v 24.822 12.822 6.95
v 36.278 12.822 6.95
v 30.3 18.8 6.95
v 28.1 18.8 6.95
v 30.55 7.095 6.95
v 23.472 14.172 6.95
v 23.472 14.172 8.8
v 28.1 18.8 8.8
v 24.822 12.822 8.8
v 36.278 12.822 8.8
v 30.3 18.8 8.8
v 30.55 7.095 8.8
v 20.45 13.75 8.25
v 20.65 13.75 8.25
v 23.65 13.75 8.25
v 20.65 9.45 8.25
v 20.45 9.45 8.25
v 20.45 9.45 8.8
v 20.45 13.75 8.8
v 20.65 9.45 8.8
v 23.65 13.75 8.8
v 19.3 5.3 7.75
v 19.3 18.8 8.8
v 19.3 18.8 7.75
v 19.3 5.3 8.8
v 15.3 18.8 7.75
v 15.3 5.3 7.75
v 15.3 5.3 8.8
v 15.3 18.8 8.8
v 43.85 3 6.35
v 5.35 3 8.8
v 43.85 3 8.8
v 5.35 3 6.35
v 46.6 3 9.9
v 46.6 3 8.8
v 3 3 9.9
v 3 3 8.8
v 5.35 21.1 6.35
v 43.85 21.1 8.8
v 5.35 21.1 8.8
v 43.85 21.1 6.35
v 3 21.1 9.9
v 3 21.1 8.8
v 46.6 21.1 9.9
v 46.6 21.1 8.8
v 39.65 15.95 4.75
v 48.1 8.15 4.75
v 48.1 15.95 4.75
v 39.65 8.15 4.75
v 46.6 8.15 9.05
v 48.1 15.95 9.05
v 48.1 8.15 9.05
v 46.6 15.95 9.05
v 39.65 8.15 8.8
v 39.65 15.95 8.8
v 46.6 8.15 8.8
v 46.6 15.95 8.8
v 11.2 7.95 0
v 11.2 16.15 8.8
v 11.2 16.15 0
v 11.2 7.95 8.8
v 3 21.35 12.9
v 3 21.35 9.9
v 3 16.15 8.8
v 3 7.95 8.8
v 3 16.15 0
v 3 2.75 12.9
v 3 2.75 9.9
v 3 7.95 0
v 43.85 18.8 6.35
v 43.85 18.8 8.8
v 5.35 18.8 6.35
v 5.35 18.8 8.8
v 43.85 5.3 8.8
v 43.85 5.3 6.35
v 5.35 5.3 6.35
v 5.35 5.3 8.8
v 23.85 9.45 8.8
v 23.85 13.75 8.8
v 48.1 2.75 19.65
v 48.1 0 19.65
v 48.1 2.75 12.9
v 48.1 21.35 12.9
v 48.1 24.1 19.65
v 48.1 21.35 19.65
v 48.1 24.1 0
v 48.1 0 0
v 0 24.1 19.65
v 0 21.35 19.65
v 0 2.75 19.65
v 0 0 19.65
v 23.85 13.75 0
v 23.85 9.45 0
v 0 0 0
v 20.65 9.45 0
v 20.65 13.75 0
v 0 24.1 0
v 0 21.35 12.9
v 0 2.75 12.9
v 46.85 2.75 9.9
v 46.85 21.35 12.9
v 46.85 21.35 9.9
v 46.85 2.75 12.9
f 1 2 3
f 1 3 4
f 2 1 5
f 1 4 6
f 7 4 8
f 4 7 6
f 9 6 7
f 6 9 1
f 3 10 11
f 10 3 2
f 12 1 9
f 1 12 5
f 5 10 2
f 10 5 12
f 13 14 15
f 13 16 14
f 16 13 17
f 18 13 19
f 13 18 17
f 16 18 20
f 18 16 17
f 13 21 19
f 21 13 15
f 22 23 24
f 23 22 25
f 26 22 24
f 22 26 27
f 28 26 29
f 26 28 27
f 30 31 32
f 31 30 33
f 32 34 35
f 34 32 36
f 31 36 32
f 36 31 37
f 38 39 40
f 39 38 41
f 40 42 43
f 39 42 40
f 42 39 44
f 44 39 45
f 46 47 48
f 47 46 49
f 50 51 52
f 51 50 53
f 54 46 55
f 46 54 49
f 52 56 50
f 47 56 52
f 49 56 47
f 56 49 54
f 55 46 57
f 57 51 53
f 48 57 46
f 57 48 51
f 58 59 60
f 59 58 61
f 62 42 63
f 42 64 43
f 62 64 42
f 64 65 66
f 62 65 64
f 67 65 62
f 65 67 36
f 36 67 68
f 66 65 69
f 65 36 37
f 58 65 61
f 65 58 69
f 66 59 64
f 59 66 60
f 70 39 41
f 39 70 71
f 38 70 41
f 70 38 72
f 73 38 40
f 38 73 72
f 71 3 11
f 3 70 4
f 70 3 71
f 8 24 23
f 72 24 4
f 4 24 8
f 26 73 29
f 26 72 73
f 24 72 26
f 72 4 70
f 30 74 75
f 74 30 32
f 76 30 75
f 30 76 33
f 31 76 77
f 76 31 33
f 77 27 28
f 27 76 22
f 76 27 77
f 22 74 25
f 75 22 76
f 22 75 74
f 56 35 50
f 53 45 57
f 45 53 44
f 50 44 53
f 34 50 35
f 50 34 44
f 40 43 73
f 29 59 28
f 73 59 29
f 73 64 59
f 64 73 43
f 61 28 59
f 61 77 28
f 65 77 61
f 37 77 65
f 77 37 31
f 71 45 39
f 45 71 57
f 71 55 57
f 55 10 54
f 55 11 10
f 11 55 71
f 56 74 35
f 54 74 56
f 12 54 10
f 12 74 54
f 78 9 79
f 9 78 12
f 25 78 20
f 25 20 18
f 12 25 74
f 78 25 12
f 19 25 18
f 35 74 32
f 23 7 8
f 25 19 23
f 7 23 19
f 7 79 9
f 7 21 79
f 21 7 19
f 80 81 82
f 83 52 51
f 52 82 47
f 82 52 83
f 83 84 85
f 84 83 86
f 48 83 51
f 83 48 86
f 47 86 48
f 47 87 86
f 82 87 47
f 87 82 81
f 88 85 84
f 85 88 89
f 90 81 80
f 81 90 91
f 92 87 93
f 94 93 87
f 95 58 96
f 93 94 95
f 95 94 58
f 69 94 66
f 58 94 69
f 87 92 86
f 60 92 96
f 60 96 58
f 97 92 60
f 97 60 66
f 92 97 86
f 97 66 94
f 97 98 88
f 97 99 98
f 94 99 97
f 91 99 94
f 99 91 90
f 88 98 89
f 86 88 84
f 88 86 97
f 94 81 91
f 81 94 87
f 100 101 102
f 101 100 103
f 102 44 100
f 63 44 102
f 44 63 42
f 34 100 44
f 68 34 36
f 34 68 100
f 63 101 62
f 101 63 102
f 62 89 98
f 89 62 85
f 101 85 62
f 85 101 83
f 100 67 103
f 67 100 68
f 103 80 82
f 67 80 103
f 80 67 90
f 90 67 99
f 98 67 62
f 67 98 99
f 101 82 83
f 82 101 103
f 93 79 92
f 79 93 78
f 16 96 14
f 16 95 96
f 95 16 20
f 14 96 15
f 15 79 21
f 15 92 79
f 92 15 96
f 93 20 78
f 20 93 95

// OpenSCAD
// file: nano.scad
// nano

// extrasize for printing
extraSize = 0.3;


// the board size
nanoWidth     = 17.8 + extraSize;
nanoLenght    = 43.3 + extraSize;
nanoThickness = 1.6 + extraSize;


// usb port measurments
usbHeight      = 4 + extraSize;
usbWidth       = 7.5 + extraSize;
usbLenght      = 9.3 + extraSize;
usbInsideBoard = 6.8 + extraSize/2;

// pins on top measurments
pinsOnTopHeight = 9 + extraSize;
pinsOnTopWidth  = 7.9 + extraSize;
pinsOnTopLenght = 5 + extraSize ;

// pinbase on top measurments
pinBaseOnTopH = 2.4 + extraSize;
pinBaseOnTopW = 2 + extraSize;

// debugLeds
ledsOnTopH       = 1 + extraSize;
ledsOnTopL       = 3.7 + extraSize;
ledsOnTopFromEnd = 12.3;

// bottomPin measurments
botSidePinH       = 8.4 + extraSize;
botSidePinW       = 2.5+ extraSize;
botSidePinL       = 38.2 + extraSize;
botSidePinFromEnd =  2.5 - extraSize/2;

// resetButton
resetButtonL     = 2.9 + extraSize;
resetButtonH     = 1.8 + extraSize;
resetButtonW     = 4.0 + extraSize;
resetButtonFromS = 7.2 + extraSize/2;
resetButtonFromE = 17.3 + extraSize/2;

// microcontroller at top
microContrH     = 0.5 + extraSize;
microContrW     = 7.8 + extraSize;
microContrMidFromE = 27.7 - extraSize/2;
microContrMidFromS = 8.5 - 5.8 - extraSize/2;

//little thing at top
tWidth = 2.4 + extraSize;

// generic stuff at bottom height
gHeight = 1.6+ extraSize;

// height of whole nano 
wholeHeight   = nanoThickness + botSidePinH  + pinsOnTopHeight;

// so that the modules arent at same plane
epsilon = 0.25;



module nano(){
	// board
	translate([0, 0,botSidePinH-epsilon]){
		cube([nanoLenght, nanoWidth, nanoThickness + 2*epsilon]);

	}
	translate([0, 0,botSidePinH]){
		// on top of nano
		onTopOfNano();	
	}
	botOfTheNano();
}

module botOfTheNano(){
	// pinns at sides
	translate([botSidePinFromEnd, 0, 0]){
		cube([botSidePinL, botSidePinW , botSidePinH]);
	}
	translate([botSidePinFromEnd, nanoWidth- botSidePinW,0]){
		cube([botSidePinL, botSidePinW , botSidePinH]);
	}
	// generic stuff
	translate([0,  botSidePinW -epsilon,botSidePinH-gHeight]){
		cube([nanoLenght, nanoWidth-2*botSidePinW + 2*epsilon  , gHeight]);
	}	
}




// all the stuff on top of the nano
module onTopOfNano(){
	//thing at top 
	translate([microContrMidFromE - tWidth/2, microContrMidFromS - tWidth/2, 
					nanoThickness])rotate([0, 0, 45]){
		cube([tWidth, microContrW, resetButtonH]);
	}
	// microcontrollerAtTop
	translate([microContrMidFromE , microContrMidFromS ,nanoThickness])rotate([0, 0, 45]){
		cube([microContrW, microContrW, resetButtonH]);
	}
	// reset button
	translate([resetButtonFromE , resetButtonFromS ,nanoThickness]){
		cube([resetButtonL, resetButtonW, microContrH]);
	}
	// leds on top
	translate([ledsOnTopFromEnd, 0,nanoThickness]){
		cube([ledsOnTopL, nanoWidth, ledsOnTopH]);
	}
	// usbPort
	translate([nanoLenght-usbInsideBoard, nanoWidth/2-usbWidth/2, nanoThickness]){
		cube([usbLenght, usbWidth, usbHeight]);
	}	
	//pins on top
	translate([0, nanoWidth/2-pinsOnTopWidth/2, nanoThickness]){
		cube([pinsOnTopWidth, pinsOnTopWidth, pinsOnTopHeight]);
	}
	// pin base on top
	translate([botSidePinFromEnd, 0, nanoThickness]){
		cube([botSidePinL, pinBaseOnTopW, pinBaseOnTopH]);
	}
	translate([botSidePinFromEnd, nanoWidth-pinBaseOnTopW, nanoThickness]){
		cube([botSidePinL, pinBaseOnTopW, pinBaseOnTopH]);
	}
}
// main file
include <nano.scad>;

bayWallT = 3;

bayWidth = nanoWidth + 2*bayWallT;
bayLenght = nanoLenght + 1.5*bayWallT;
bayHeight  = wholeHeight  - epsilon;

bayholeHeight  = pinsOnTopHeight + bayWallT - nanoThickness - epsilon;

nanoBay();

module nanoBay(){
	difference(){
		//bayBase
		cube([bayLenght, bayWidth, bayHeight]);
		// a nanoSized hole
		translate([bayWallT, bayWallT-epsilon, bayholeHeight- epsilon]){
			cube([nanoLenght+epsilon, nanoWidth+ 2*epsilon, bayholeHeight]);
		}
		// nanohole
		rotate([180])translate([bayWallT,-nanoWidth-bayWallT,
					 -wholeHeight+epsilon])	{
			nano();
		}
		// hole forvard and backvards
		translate([-epsilon, bayWallT-epsilon, bayholeHeight +bayWallT - epsilon]){
			cube([nanoLenght+epsilon+ 2* bayWallT, nanoWidth+ 2*epsilon, 
					bayholeHeight]);
		}
		translate([resetButtonFromE + resetButtonL,
					 nanoWidth + bayWallT -resetButtonFromS - resetButtonW, -epsilon]){
			cube([resetButtonL, resetButtonW , bayholeHeight]);
		}
	}
}
